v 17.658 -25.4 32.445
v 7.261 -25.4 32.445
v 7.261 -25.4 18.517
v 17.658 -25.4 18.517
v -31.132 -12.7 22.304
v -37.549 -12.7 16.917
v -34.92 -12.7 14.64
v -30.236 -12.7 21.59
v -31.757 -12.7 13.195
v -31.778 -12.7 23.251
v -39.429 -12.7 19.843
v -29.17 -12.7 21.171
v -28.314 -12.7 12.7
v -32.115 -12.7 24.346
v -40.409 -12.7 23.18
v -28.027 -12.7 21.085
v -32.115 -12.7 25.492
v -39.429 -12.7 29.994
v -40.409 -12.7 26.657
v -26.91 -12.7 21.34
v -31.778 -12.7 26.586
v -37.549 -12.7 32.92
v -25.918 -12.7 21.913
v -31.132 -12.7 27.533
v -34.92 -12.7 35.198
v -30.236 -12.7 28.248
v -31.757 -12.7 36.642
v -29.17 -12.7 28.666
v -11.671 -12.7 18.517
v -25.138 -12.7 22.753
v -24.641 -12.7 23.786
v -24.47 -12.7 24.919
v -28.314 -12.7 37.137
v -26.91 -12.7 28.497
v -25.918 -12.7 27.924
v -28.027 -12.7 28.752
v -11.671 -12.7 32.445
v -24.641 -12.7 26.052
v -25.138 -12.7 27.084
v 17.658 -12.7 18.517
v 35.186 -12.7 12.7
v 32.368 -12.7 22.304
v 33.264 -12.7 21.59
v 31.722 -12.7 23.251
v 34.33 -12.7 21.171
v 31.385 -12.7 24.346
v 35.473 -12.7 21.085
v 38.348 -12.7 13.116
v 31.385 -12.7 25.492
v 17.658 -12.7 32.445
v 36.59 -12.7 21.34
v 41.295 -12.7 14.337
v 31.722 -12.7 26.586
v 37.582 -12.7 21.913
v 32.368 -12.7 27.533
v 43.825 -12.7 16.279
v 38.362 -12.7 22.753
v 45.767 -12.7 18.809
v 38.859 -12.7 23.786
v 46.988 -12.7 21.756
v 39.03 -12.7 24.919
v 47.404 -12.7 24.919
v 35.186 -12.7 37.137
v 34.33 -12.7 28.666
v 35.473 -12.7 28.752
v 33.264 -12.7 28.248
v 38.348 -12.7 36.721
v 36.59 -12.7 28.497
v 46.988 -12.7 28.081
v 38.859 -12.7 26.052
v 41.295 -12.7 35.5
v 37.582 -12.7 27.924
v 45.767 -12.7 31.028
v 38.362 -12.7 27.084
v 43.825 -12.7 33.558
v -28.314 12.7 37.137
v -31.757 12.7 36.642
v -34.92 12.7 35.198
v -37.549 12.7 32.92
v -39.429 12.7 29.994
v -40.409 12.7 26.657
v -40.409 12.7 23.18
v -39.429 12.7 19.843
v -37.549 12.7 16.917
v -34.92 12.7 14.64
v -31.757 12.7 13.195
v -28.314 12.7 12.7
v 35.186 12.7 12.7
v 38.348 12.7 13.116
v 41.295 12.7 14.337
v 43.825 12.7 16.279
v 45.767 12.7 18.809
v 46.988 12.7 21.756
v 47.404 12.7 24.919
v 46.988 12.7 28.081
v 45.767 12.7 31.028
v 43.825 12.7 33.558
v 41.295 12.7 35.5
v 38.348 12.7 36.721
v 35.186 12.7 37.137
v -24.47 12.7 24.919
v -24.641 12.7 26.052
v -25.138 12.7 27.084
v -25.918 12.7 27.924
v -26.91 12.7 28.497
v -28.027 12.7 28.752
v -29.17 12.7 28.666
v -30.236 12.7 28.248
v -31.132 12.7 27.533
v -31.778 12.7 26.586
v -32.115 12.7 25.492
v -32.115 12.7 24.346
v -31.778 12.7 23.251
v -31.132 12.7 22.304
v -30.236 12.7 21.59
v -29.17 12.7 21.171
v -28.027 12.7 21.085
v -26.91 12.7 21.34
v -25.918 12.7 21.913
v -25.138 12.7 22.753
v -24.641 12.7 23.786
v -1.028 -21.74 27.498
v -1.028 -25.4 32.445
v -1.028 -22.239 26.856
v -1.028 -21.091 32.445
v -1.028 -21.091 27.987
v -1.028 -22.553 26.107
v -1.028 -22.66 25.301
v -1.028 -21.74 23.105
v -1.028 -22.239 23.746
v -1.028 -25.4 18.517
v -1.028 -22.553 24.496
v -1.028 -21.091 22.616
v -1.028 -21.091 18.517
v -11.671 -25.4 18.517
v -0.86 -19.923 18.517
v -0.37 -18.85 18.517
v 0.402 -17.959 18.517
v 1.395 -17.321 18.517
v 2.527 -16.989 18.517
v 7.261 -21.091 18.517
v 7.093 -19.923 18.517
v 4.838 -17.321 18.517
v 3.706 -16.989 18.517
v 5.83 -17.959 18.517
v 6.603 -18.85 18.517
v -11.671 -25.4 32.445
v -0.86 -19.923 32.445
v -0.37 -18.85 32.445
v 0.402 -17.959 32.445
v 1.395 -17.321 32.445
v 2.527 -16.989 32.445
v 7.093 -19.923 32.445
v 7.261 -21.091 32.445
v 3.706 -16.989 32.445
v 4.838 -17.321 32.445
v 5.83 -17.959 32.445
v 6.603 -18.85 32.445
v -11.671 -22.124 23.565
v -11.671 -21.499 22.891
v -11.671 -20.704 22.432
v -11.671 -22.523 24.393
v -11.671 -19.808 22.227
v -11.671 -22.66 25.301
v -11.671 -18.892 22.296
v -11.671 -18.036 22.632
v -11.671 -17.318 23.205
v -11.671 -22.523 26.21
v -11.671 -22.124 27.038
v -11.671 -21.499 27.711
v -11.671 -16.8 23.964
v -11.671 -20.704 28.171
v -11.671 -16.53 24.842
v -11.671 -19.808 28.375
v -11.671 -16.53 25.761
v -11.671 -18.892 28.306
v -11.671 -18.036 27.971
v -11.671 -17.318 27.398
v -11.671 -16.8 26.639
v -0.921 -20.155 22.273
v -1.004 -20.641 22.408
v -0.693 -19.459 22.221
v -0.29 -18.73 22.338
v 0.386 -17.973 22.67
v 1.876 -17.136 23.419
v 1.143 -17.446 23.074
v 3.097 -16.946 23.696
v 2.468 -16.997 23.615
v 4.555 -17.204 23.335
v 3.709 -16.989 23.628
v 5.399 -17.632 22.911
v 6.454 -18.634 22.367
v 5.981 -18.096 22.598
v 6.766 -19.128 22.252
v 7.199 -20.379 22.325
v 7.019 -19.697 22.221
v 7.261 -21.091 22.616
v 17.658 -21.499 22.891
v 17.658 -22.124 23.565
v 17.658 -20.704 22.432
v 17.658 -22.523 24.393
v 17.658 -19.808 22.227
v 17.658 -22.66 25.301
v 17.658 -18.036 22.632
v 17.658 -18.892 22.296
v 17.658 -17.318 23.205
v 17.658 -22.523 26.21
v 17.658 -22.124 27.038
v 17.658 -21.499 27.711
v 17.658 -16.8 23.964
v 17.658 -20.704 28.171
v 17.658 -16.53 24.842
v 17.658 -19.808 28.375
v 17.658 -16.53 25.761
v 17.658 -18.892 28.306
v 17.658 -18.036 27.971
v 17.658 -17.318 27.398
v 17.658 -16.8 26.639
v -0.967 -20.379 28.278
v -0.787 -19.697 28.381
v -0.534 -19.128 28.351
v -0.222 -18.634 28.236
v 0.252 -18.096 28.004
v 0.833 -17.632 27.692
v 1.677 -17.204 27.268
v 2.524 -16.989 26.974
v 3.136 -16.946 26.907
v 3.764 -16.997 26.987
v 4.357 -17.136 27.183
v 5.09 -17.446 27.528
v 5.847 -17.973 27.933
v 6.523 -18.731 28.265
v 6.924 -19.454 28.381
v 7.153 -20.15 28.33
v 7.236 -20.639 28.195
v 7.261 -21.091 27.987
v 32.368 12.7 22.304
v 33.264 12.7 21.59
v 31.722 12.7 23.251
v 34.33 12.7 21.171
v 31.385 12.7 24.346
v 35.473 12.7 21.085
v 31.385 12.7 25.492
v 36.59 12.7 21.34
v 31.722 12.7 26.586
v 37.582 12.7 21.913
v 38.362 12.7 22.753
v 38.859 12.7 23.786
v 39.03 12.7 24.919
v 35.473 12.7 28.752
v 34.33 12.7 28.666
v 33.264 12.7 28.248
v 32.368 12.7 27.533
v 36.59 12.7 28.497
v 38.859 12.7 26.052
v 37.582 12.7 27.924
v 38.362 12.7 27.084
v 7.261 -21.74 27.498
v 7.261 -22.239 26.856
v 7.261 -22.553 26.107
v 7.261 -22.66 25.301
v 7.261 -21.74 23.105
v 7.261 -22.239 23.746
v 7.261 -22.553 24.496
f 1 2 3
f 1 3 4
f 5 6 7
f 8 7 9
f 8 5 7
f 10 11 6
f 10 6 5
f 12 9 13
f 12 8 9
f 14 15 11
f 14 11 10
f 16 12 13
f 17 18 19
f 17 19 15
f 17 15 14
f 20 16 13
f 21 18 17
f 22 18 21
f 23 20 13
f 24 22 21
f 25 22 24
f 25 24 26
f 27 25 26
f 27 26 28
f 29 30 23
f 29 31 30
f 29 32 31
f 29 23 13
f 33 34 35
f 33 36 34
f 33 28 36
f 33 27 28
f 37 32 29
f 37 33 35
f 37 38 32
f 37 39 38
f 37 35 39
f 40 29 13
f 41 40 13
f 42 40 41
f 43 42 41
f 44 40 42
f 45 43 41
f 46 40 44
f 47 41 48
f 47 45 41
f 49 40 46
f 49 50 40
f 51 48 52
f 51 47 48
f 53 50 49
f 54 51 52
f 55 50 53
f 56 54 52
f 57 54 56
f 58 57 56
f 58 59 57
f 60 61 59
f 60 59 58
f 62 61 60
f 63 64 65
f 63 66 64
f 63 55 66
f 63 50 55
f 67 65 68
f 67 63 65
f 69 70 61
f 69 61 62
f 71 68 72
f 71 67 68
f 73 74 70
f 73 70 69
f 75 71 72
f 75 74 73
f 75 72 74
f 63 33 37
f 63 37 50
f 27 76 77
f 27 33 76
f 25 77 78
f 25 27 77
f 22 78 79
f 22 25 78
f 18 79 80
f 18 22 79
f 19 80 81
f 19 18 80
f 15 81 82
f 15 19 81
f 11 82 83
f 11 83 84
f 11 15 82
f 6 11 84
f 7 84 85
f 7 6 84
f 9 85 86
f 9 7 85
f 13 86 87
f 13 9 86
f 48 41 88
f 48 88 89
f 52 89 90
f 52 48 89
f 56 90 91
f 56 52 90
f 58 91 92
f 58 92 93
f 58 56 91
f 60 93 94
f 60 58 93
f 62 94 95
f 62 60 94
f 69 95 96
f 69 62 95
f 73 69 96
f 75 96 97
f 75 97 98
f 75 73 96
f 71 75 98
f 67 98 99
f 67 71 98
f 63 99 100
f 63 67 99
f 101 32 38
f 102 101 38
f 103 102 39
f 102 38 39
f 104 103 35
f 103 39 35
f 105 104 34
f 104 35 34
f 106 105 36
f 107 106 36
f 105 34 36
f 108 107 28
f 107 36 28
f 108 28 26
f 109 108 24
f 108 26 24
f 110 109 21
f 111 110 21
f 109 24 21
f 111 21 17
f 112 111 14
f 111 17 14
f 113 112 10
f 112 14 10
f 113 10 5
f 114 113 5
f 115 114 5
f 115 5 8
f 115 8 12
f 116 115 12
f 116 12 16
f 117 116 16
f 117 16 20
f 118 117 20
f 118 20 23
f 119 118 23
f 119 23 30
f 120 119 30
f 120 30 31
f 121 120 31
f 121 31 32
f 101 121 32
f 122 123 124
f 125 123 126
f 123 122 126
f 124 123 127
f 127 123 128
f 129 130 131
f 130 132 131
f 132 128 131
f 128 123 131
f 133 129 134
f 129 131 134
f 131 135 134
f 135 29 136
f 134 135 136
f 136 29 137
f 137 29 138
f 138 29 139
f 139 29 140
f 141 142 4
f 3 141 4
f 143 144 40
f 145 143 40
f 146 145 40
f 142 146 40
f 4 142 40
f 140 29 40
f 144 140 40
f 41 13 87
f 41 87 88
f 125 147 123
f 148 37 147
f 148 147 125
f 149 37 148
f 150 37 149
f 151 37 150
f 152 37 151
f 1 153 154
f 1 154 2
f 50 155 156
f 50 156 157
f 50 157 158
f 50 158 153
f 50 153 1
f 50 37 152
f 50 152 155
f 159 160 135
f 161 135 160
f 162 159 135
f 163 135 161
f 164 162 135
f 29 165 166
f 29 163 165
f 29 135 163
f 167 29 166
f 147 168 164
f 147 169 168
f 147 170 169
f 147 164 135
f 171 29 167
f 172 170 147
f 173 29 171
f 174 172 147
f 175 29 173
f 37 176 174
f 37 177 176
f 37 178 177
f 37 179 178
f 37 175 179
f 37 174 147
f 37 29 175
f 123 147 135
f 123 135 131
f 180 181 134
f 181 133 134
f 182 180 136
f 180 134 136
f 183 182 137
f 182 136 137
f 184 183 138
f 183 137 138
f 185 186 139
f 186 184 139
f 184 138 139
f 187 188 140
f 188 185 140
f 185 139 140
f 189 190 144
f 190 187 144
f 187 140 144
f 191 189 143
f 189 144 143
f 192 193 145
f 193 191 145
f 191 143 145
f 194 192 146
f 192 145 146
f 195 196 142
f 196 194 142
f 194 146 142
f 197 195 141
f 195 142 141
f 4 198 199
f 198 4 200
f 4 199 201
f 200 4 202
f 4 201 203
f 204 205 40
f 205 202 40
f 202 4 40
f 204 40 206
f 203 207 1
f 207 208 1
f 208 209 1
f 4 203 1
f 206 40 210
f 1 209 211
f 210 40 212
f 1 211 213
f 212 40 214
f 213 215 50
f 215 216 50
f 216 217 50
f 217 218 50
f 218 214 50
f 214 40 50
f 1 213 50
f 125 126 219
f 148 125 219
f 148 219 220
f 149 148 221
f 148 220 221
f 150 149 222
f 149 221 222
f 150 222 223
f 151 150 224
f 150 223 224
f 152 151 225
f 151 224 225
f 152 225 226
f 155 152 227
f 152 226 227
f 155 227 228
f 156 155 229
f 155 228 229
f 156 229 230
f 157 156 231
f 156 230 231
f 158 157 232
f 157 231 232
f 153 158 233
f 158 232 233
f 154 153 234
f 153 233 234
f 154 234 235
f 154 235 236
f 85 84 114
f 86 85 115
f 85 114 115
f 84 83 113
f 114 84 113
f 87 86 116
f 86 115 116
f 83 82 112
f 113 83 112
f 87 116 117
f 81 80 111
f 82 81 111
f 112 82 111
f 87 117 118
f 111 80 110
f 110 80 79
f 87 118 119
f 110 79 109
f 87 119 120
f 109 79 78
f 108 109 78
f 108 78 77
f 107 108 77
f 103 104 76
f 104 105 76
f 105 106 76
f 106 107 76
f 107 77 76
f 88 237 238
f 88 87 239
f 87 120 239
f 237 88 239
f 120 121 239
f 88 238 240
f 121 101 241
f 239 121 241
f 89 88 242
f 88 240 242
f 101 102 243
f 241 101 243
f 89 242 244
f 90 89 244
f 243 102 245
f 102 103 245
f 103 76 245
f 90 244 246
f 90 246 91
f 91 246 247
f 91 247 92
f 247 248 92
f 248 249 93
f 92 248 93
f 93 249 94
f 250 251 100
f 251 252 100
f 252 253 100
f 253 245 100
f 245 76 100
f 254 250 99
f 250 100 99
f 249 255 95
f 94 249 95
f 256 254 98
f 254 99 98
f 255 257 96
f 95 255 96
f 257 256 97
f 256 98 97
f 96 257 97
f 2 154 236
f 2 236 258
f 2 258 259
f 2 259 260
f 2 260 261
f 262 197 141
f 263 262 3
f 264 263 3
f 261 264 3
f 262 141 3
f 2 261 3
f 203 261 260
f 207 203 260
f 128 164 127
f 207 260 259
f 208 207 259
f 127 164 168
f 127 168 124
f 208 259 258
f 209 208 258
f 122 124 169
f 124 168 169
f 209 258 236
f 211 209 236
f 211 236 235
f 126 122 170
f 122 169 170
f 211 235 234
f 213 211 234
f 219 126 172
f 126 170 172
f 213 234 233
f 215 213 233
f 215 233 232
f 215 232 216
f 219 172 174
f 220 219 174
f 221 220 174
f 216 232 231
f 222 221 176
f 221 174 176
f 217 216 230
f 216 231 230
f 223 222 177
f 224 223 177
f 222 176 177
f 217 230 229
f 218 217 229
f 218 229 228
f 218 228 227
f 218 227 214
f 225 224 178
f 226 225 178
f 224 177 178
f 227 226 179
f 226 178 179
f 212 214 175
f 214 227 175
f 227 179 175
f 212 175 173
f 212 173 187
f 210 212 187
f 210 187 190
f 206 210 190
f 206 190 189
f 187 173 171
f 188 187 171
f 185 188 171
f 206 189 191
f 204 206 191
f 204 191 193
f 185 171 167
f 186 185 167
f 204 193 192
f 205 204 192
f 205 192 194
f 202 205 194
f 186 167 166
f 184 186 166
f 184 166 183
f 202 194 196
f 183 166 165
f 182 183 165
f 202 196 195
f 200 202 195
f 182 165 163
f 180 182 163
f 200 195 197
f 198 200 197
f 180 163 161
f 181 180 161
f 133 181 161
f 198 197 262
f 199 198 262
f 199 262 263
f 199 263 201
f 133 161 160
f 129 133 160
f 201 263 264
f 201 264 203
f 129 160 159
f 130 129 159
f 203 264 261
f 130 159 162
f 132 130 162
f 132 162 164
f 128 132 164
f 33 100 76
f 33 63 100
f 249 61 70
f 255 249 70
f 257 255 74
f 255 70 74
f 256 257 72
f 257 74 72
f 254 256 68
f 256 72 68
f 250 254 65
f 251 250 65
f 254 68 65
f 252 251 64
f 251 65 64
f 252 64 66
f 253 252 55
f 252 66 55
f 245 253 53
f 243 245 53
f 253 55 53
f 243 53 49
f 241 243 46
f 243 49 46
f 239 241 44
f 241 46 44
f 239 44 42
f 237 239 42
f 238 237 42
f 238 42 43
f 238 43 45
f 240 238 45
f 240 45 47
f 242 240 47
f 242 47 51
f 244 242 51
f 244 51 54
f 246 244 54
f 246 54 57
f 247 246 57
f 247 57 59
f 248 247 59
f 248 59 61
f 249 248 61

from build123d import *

# Parameters (mm, degrees)
F1_DEPTH  = 12.7
F2_DEPTH  = 12.7
F3_R      = 3.8439536327
F4_DEPTH  = 25.401
F5_W      = 29.3294070289
F5_H      = 13.9285232872
F6_DEPTH  = 12.7
F8_DEPTH  = 18.6216022351
F9_R      = 3.0824278946
F10_DEPTH = 59.0766736131


with BuildPart() as f1:
    # F0 (on Front) → F1 (new body, symmetric)
    with BuildSketch(Plane.XZ):
        with BuildLine():
            Line((35.185629891, 37.1372154056), (-28.314370109, 37.1372154056))
            ThreePointArc((-28.314370109, 37.1372154056), (-19.6745097456, 33.5584680661), (-16.0957624062, 24.9186077028))
            ThreePointArc((-16.0957624062, 24.9186077028), (-19.6745097456, 16.2787473395), (-28.314370109, 12.7))
            Line((-28.314370109, 12.7), (35.185629891, 12.7))
            ThreePointArc((35.185629891, 12.7), (22.9670221883, 24.9186077028), (35.185629891, 37.1372154056))
        make_face()
        with BuildLine():
            ThreePointArc((47.4042375938, 24.9186077028), (43.8254902544, 33.5584680661), (35.185629891, 37.1372154056))
            ThreePointArc((35.185629891, 37.1372154056), (22.9670221883, 24.9186077028), (35.185629891, 12.7))
            ThreePointArc((35.185629891, 12.7), (43.8254902544, 16.2787473395), (47.4042375938, 24.9186077028))
        make_face()
    extrude(amount=F1_DEPTH, both=True)

    # F0 (on Front) → F2 (join, symmetric)
    with BuildSketch(Plane.XZ):
        with BuildLine():
            ThreePointArc((-16.0957624062, 24.9186077028), (-19.6745097456, 33.5584680661), (-28.314370109, 37.1372154056))
            ThreePointArc((-28.314370109, 37.1372154056), (-40.5329778117, 24.9186077028), (-28.314370109, 12.7))
            ThreePointArc((-28.314370109, 12.7), (-19.6745097456, 16.2787473395), (-16.0957624062, 24.9186077028))
        make_face()
        with BuildLine():
            Line((35.185629891, 37.1372154056), (-28.314370109, 37.1372154056))
            ThreePointArc((-28.314370109, 37.1372154056), (-19.6745097456, 33.5584680661), (-16.0957624062, 24.9186077028))
            ThreePointArc((-16.0957624062, 24.9186077028), (-19.6745097456, 16.2787473395), (-28.314370109, 12.7))
            Line((-28.314370109, 12.7), (35.185629891, 12.7))
            ThreePointArc((35.185629891, 12.7), (22.9670221883, 24.9186077028), (35.185629891, 37.1372154056))
        make_face()
        with BuildLine():
            ThreePointArc((47.4042375938, 24.9186077028), (43.8254902544, 33.5584680661), (35.185629891, 37.1372154056))
            ThreePointArc((35.185629891, 37.1372154056), (22.9670221883, 24.9186077028), (35.185629891, 12.7))
            ThreePointArc((35.185629891, 12.7), (43.8254902544, 16.2787473395), (47.4042375938, 24.9186077028))
        make_face()
    extrude(amount=F2_DEPTH, both=True)

    # F3 (on face) → F4 (cut, through all)
    with BuildSketch(Plane.XZ.offset(12.7)):
        with Locations((-28.314370109, 24.9186077028)):
            Circle(F3_R)
        with Locations((35.185629891, 24.9186077028)):
            Circle(F3_R)
    extrude(amount=-F4_DEPTH, mode=Mode.SUBTRACT)

    # F5 (on face) → F6 (join)
    with BuildSketch(Plane.XZ.offset(12.7)):
        with Locations((2.9932674952, 25.4808748141)):
            Rectangle(F5_W, F5_H)
    extrude(amount=F6_DEPTH)

    # F7 (on face) → F8 (cut, through all)
    with BuildSketch(Plane(origin=(0, 0, 18.5166131705), x_dir=(1, 0, 0), z_dir=(0, 0, -1))):
        with BuildLine():
            Line((7.2608599439, 21.0908427835), (7.2608599439, 25.4))
            Line((7.2608599439, 25.4), (-1.028164872, 25.4))
            Line((-1.028164872, 25.4), (-1.028164872, 21.0908427835))
            ThreePointArc((-1.028164872, 21.0908427835), (3.116347536, 16.9463303755), (7.2608599439, 21.0908427835))
        make_face()
    extrude(amount=-F8_DEPTH, mode=Mode.SUBTRACT)

    # F9 (on face) → F10 (cut, through all)
    with BuildSketch(Plane(origin=(-11.6714360192, 0, 0), x_dir=(0, -1, 0), z_dir=(-1, 0, 0))):
        with Locations((19.5776261389, 25.3012273461)):
            Circle(F9_R)
    extrude(amount=-F10_DEPTH, mode=Mode.SUBTRACT)


solid = f1.part
